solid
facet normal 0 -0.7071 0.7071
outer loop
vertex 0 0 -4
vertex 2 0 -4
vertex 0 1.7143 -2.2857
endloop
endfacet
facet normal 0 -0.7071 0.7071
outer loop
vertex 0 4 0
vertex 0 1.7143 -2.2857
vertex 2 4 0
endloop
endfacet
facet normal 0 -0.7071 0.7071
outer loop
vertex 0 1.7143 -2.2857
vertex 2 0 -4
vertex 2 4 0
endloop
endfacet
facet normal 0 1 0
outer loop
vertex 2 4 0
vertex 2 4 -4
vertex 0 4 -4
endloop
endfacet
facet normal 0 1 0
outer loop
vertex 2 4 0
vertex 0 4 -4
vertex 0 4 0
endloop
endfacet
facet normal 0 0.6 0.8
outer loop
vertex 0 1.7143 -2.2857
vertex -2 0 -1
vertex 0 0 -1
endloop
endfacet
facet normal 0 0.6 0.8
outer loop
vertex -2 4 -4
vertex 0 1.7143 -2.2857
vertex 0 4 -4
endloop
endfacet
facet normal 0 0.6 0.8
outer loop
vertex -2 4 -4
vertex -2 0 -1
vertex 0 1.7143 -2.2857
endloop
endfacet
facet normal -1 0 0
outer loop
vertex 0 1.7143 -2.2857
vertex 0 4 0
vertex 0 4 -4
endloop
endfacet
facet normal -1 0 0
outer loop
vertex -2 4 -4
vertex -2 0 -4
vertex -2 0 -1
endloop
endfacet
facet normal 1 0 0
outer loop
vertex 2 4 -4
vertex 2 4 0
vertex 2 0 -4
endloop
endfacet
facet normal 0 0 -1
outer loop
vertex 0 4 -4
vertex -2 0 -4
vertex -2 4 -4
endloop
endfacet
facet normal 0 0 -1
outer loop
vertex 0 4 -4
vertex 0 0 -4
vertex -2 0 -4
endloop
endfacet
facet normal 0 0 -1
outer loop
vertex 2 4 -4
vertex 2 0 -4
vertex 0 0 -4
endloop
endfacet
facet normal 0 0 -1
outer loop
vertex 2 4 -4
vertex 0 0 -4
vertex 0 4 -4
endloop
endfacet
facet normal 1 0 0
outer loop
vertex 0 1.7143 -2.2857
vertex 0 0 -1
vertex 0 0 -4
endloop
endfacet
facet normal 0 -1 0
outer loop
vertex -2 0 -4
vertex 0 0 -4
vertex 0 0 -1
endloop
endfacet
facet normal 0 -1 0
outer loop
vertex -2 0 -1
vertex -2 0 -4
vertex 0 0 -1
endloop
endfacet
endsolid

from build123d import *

# Parameters (mm, degrees)
SKETCH1_W           = 4
SKETCH1_H           = 4
BOSS_EXTRUDE1_DEPTH = 2
SKETCH2_W           = 3
SKETCH2_H           = 4
BOSS_EXTRUDE2_DEPTH = 2
CUT_EXTRUDE1_DEPTH  = 2
CUT_EXTRUDE2_DEPTH  = 2


with BuildPart() as part:
    # Sketch1 → Boss-Extrude1 (new body)
    with BuildSketch(Plane(origin=(0, 0, 0), x_dir=(0, 0, -1), z_dir=(1, 0, 0))):
        with Locations((2, 2)):
            Rectangle(SKETCH1_W, SKETCH1_H)
    extrude(amount=BOSS_EXTRUDE1_DEPTH)

    # Sketch2 → Boss-Extrude2 (add)
    with BuildSketch(Plane.ZY):
        with Locations((-2.5, 2)):
            Rectangle(SKETCH2_W, SKETCH2_H)
    extrude(amount=BOSS_EXTRUDE2_DEPTH)

    # Sketch3 → Cut-Extrude1 (cut)
    with BuildSketch(Plane(origin=(2, 0, 0), x_dir=(0, 0, -1), z_dir=(1, 0, 0))):
        Polygon((4, 0), (0, 4), (0, 0), align=None)
    extrude(amount=-CUT_EXTRUDE1_DEPTH, mode=Mode.SUBTRACT)

    # Sketch4 → Cut-Extrude2 (cut)
    with BuildSketch(Plane.ZY.offset(2)):
        Polygon((-1, 0), (-4, 4), (-1, 4), align=None)
    extrude(amount=-CUT_EXTRUDE2_DEPTH, mode=Mode.SUBTRACT)


solid = part.part
